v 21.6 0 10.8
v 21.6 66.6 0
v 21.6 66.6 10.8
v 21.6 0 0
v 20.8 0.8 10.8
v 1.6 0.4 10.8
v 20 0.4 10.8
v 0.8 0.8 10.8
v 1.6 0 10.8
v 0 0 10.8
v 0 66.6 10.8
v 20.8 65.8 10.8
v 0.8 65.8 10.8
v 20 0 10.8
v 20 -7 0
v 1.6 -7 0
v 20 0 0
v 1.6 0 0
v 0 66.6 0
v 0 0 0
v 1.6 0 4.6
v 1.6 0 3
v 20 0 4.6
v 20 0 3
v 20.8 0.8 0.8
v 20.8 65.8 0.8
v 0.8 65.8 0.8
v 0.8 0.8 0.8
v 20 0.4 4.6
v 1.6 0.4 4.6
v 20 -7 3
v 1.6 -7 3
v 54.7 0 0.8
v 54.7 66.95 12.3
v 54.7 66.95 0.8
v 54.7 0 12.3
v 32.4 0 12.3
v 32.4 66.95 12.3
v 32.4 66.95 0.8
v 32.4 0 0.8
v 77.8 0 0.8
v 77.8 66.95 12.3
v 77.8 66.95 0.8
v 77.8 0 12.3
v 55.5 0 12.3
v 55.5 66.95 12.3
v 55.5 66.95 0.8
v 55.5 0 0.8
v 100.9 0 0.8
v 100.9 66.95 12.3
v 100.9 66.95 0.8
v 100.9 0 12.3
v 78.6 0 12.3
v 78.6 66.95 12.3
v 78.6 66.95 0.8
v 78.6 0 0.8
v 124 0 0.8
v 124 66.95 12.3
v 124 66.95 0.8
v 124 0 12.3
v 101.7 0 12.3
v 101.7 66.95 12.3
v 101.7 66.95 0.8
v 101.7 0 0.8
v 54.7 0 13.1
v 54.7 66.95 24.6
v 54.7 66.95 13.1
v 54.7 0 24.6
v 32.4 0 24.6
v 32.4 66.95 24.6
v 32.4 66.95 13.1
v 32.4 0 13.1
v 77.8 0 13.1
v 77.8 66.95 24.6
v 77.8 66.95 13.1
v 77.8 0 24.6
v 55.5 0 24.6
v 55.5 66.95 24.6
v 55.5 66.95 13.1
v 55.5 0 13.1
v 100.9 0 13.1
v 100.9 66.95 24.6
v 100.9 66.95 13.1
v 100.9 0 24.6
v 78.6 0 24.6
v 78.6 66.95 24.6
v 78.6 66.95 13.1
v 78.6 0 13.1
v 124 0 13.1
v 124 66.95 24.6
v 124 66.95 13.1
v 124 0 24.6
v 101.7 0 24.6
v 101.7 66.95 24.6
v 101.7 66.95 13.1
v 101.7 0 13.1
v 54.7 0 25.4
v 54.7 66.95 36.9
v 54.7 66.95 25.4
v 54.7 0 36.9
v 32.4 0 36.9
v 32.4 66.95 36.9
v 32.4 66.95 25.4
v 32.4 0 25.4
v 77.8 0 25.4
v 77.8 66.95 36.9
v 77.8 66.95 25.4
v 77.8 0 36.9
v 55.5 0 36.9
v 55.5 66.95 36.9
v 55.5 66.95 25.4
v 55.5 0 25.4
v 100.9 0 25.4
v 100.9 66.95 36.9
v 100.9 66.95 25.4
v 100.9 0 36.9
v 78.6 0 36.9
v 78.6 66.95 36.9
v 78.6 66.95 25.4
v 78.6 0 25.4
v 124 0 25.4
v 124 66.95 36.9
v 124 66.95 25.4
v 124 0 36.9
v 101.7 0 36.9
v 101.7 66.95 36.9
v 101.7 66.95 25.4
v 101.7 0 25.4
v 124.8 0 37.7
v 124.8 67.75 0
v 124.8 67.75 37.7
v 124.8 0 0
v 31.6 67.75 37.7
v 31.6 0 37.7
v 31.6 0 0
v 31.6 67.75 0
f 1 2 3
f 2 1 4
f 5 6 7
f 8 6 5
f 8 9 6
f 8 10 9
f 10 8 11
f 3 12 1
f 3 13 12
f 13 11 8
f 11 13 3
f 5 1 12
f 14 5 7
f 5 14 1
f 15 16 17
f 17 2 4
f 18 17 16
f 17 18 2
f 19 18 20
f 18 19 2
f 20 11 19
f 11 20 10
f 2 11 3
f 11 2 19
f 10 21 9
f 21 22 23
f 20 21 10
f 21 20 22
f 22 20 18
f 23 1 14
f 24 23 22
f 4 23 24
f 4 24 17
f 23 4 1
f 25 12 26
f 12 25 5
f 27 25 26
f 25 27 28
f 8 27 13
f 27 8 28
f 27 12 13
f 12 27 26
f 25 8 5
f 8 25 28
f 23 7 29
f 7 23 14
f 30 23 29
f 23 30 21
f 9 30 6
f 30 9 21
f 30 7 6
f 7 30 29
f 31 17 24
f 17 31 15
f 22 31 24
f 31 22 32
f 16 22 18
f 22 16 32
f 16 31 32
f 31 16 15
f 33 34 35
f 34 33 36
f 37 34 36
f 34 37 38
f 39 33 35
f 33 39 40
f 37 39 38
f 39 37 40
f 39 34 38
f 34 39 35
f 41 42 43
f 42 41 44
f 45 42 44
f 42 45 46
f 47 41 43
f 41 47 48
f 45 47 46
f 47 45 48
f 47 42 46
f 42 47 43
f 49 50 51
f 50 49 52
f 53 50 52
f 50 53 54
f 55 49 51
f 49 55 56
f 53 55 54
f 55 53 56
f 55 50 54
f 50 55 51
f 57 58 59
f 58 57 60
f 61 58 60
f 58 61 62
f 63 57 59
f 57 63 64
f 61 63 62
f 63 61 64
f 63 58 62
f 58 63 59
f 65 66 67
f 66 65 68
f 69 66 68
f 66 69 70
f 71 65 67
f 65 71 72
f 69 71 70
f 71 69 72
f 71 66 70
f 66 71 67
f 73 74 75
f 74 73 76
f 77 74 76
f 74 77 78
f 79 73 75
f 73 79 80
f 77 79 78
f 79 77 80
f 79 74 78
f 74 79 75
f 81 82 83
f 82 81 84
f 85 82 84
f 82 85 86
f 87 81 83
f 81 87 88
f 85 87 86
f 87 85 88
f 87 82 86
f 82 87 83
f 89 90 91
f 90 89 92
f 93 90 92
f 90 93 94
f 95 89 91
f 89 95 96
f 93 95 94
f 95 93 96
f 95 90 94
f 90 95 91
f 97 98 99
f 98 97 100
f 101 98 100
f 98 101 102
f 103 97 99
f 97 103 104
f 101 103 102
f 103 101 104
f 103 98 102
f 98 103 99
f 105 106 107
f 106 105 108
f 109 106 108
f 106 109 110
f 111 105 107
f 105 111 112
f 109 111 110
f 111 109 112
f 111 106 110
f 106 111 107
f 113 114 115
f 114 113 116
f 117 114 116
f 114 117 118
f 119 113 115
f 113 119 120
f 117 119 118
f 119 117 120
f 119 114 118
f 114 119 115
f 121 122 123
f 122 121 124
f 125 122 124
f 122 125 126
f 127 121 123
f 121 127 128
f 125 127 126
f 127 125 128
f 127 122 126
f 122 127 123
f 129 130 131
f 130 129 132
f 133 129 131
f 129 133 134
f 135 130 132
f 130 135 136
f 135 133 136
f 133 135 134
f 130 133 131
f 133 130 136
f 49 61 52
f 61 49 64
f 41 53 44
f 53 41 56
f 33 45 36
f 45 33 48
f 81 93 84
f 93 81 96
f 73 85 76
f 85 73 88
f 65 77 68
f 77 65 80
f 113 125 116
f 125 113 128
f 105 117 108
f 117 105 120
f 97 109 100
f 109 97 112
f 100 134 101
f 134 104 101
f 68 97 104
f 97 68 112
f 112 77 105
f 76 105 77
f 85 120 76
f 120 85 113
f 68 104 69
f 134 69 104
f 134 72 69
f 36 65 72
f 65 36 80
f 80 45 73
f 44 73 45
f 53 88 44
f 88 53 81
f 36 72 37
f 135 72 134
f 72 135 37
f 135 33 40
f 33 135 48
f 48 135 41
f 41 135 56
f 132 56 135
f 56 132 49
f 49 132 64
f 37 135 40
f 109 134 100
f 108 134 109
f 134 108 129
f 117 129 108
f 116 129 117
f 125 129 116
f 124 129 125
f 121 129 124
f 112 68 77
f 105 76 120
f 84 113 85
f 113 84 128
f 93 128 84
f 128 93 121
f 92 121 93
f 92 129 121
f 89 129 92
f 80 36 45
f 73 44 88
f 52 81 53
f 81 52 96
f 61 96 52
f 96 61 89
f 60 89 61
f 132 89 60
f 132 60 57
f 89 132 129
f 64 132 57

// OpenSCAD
// preview[view:south west, tilt:top diagonal]

// ============================================================
// PRINT PROFILE (see PRINTER.md for full slicer profile values)
// ------------------------------------------------------------
// Material:    PETG Basic — the handle takes repeated finger-pull force and
//               the drawer/enclosure slide-fit (enclosureClearance) wears
//               under repeated friction; PETG's toughness suits both better
//               than PLA. Light-duty desk use would tolerate PLA fine too,
//               if minimizing cost/print time matters more here.
// Nozzle:      0.4mm — matches this file's own `nozzleSize` parameter
//               default (see Printer specific section below); no fine detail.
// Quality:     0.20mm Standard.
// Infill:      25% for both drawer and enclosure — handle/slide-fit take
//               repeated mechanical stress, a moderate step above the 15%
//               decorative default without maxing it out.
// Orientation: drawer prints as modeled (no rotation needed). The enclosure
//               piece is a special case already solved in this file's own
//               code, not something to redecide — `print_part()` applies
//               `rotate([270,0,0])` automatically when part="enclosure" (see
//               below), so trust that existing rotation rather than
//               reorienting manually.
// Overrides:   this file already exposes `nozzleSize`(0.4) and `walls`(0.8,
//               i.e. 2 perimeters at 0.4mm) as design parameters that its own
//               wall-thickness math depends on — keep them matched to
//               whatever nozzle/wall-loop count is actually used when
//               slicing, or the parametric clearances won't be accurate.
// ============================================================

/* [Drawer: Base] */
// Inner width of the drawer
drawerWidthInner = 20;
// Inner height of the drawer
drawerHeightInner = 10;
// Inner length of the drawer
drawerLengthInner = 65;

/* [Drawer: Label] */
// Enable cutout for a label?
enabelLabel = "true"; // [true,false]
// The depth of the label should be the multiple of your nozzle size
depthLabel = 0.4;

/* [Drawer: Handle] */
// Height of the handle
handleHeight = 3;
// How  much the handle sticks out of the drawer
handleDepth = 7;
// The length of the handle. This should not be more than the width of the drawer 
handleLength = 18.4;
// Indent Width
handleIndentWidth = 0;
// Indent depth of top of handle
handleIndentTop = 0;
// Indent depth on the side of the handle
handleIndentSide = 0; 

/* [Enclosure] */
// Choose the amount of columns
columns = 4; // [1:100]
// Choose the amount of rows
rows = 3; // [1:100]
// The slot for the drawer will be by this much bigger than the drawer itself. Set this to a value accounting for shrinking/expansion of the material you are using.
enclosureClearance = 0.7;

/* [Printer specific] */
// Nozzle diameter of your printer
nozzleSize = 0.4;
// Walls should be a multiple of your nozzle size
walls = 0.8;

/* [View] */
// Which parts would you like to see?
part = "all"; // [drawer:Drawer Only, enclosure:Enclosure Only, all:Enclosure and Drawer]

/* [Hidden] */
drawerWidthOuter = drawerWidthInner + walls * 2;
drawerHeightOuter = drawerHeightInner + walls;
drawerLengthOuter = drawerLengthInner + walls * 2;

print_part();

module print_part() {
	if(part == "enclosure")
		rotate([270, 0, 0])
			printEnclosure();
	else if(part == "drawer")
		printDrawer();
	else
		printBoth();
}

module printEnclosure() {
	enclosure(rows, columns, drawerLengthOuter, drawerWidthOuter, drawerHeightOuter, enclosureClearance, walls);
}

module printDrawer() {
	drawer(drawerWidthInner, drawerHeightInner, drawerLengthInner, walls, enabelLabel, depthLabel, handleLength, handleDepth, handleHeight, handleIndentTop, handleIndentSide, handleIndentWidth);
}

module printBoth() {
	printDrawer();

	translate([drawerWidthOuter + 10, 0, 0])
		printEnclosure();
}

module enclosure(rows, columns, length, width, height, padding, walls) {
	widthSingle = width + padding;
	heightSingle = height + padding;
	lengthSingle = length + (padding / 2);

	widthOuter = (widthSingle + walls) * columns + walls;
	heightOuter = (heightSingle + walls) * rows + walls;
	lengthOuter = lengthSingle + walls;

	difference() {
		cube([widthOuter, lengthOuter, heightOuter]);
		
		for(row = [0 : rows - 1])
			for(column = [0 : columns - 1])
				translate([walls + (widthSingle + walls) * column, -1, walls + (heightSingle + walls) * row])
					cube([widthSingle, lengthSingle + 1, heightSingle]);
	}
	
}

module drawer(width, height, length, walls, label, depthLabel, lengthHandle, depthHandle, heightHandle, topIndent, sideIndent, widthIndent) {
	widthOuter = width + walls * 2;
	heightOuter = height + walls;
	lengthOuter = length + walls * 2;

	difference() {
		cube([widthOuter, lengthOuter, heightOuter]);

		translate([walls, walls, walls])
			cube([width, length, height + 1]);

		/* Cutout for the label */
		if(label== "true")
			translate([walls * 2, -1, handleHeight + walls * 2])
				cube([width - (walls * 2), 1 + depthLabel, height + 1]);
	}

	/* Attach the handle */
	translate([(widthOuter - lengthHandle) / 2, -depthHandle, 0]) {
		difference() {
			cube([lengthHandle, depthHandle, heightHandle]);

			/* Top indent */
			if(topIndent > 0 && widthIndent > 0)
				translate([-1, depthHandle - widthIndent, heightHandle - topIndent])
					cube([lengthHandle + 2, widthIndent + 1, topIndent + 1]);

			/* Left indent */
			if(sideIndent > 0 && widthIndent > 0)
				translate([-1, depthHandle - widthIndent, -1])
					cube([sideIndent + 1, widthIndent + 1, heightHandle + 2]);

			/* Right indent */
			if(sideIndent > 0 && widthIndent > 0)
				translate([lengthHandle - sideIndent, depthHandle - widthIndent, -1])
					cube([sideIndent + 1, widthIndent + 1, heightHandle + 2]);
		}
	}
}
